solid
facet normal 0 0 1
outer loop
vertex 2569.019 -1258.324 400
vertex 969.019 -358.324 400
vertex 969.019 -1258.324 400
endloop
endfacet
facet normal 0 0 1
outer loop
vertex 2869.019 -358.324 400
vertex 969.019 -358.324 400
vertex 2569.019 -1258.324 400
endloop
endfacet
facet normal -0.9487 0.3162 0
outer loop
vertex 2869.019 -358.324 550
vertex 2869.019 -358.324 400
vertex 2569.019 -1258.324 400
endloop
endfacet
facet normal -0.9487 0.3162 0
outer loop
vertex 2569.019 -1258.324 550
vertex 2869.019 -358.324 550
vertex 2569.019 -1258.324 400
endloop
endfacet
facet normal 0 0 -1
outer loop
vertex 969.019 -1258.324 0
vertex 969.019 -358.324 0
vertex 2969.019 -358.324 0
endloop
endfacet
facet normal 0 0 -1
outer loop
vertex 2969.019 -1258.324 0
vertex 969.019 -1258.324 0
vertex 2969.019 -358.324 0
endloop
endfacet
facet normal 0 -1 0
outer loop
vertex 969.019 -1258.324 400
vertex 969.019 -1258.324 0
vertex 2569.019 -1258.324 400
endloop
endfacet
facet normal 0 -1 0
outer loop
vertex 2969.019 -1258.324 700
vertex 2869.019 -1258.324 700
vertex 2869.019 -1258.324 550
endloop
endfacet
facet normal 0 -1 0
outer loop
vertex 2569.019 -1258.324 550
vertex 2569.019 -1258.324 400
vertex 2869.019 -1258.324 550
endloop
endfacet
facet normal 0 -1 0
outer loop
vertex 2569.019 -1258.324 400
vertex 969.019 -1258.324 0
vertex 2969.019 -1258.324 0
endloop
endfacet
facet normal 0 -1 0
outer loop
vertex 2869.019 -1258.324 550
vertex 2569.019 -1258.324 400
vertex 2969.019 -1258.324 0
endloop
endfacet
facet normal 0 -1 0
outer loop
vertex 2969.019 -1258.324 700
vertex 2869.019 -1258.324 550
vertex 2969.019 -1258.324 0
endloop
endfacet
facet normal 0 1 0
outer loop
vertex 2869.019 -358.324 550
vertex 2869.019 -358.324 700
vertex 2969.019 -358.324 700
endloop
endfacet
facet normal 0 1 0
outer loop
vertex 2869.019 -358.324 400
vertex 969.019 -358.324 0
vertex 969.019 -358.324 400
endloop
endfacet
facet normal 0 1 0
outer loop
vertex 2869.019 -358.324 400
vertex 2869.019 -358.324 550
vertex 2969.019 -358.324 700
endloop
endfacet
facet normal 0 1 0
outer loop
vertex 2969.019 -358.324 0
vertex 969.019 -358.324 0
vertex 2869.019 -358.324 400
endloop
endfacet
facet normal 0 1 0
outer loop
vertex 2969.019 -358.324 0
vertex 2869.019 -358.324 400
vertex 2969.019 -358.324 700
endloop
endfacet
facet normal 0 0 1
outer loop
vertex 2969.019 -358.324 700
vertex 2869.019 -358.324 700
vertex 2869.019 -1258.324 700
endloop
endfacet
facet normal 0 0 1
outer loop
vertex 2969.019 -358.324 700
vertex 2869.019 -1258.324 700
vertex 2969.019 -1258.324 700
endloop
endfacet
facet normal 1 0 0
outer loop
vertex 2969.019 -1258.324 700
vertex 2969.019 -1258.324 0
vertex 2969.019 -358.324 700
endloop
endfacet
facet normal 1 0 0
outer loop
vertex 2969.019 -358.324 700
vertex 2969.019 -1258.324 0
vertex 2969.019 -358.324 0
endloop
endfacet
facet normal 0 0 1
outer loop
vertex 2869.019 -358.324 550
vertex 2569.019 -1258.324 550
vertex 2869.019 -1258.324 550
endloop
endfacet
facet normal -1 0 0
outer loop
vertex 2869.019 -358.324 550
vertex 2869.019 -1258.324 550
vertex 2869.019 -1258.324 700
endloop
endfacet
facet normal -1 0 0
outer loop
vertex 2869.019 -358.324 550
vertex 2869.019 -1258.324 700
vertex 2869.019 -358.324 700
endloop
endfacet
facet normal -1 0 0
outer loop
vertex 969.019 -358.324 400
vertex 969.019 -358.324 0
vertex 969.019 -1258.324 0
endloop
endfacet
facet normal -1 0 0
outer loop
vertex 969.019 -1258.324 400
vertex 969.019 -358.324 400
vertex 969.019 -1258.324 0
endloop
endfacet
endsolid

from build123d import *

# Parameters (mm, degrees)
F2_DEPTH = 400
F3_DEPTH = 550
F0_W     = 100
F0_H     = 900
F4_DEPTH = 700


# Not quite as in the source:
# - the program builds the solid bodies; features that only make, move or delete a surface that nothing else refers to are left out


with BuildPart() as f2:
    # F0 (on Top) → F2 (new body)
    with BuildSketch(Plane.XY):
        Polygon((2869.0189361572, -358.3241462708), (969.0189361572, -358.3241462708), (969.0189361572, -1258.3241462708), (2569.0189361572, -1258.3241462708), align=None)
    extrude(amount=F2_DEPTH)

    # F0 (on Top) → F3 (join)
    with BuildSketch(Plane.XY):
        Polygon((2869.0189361572, -1258.3241462708), (2869.0189361572, -358.3241462708), (2569.0189361572, -1258.3241462708), align=None)
    extrude(amount=F3_DEPTH)

    # F0 (on Top) → F4 (join)
    with BuildSketch(Plane.XY):
        with Locations((2919.0189361572, -808.3241462708)):
            Rectangle(F0_W, F0_H)
    extrude(amount=F4_DEPTH)


solid = f2.part
